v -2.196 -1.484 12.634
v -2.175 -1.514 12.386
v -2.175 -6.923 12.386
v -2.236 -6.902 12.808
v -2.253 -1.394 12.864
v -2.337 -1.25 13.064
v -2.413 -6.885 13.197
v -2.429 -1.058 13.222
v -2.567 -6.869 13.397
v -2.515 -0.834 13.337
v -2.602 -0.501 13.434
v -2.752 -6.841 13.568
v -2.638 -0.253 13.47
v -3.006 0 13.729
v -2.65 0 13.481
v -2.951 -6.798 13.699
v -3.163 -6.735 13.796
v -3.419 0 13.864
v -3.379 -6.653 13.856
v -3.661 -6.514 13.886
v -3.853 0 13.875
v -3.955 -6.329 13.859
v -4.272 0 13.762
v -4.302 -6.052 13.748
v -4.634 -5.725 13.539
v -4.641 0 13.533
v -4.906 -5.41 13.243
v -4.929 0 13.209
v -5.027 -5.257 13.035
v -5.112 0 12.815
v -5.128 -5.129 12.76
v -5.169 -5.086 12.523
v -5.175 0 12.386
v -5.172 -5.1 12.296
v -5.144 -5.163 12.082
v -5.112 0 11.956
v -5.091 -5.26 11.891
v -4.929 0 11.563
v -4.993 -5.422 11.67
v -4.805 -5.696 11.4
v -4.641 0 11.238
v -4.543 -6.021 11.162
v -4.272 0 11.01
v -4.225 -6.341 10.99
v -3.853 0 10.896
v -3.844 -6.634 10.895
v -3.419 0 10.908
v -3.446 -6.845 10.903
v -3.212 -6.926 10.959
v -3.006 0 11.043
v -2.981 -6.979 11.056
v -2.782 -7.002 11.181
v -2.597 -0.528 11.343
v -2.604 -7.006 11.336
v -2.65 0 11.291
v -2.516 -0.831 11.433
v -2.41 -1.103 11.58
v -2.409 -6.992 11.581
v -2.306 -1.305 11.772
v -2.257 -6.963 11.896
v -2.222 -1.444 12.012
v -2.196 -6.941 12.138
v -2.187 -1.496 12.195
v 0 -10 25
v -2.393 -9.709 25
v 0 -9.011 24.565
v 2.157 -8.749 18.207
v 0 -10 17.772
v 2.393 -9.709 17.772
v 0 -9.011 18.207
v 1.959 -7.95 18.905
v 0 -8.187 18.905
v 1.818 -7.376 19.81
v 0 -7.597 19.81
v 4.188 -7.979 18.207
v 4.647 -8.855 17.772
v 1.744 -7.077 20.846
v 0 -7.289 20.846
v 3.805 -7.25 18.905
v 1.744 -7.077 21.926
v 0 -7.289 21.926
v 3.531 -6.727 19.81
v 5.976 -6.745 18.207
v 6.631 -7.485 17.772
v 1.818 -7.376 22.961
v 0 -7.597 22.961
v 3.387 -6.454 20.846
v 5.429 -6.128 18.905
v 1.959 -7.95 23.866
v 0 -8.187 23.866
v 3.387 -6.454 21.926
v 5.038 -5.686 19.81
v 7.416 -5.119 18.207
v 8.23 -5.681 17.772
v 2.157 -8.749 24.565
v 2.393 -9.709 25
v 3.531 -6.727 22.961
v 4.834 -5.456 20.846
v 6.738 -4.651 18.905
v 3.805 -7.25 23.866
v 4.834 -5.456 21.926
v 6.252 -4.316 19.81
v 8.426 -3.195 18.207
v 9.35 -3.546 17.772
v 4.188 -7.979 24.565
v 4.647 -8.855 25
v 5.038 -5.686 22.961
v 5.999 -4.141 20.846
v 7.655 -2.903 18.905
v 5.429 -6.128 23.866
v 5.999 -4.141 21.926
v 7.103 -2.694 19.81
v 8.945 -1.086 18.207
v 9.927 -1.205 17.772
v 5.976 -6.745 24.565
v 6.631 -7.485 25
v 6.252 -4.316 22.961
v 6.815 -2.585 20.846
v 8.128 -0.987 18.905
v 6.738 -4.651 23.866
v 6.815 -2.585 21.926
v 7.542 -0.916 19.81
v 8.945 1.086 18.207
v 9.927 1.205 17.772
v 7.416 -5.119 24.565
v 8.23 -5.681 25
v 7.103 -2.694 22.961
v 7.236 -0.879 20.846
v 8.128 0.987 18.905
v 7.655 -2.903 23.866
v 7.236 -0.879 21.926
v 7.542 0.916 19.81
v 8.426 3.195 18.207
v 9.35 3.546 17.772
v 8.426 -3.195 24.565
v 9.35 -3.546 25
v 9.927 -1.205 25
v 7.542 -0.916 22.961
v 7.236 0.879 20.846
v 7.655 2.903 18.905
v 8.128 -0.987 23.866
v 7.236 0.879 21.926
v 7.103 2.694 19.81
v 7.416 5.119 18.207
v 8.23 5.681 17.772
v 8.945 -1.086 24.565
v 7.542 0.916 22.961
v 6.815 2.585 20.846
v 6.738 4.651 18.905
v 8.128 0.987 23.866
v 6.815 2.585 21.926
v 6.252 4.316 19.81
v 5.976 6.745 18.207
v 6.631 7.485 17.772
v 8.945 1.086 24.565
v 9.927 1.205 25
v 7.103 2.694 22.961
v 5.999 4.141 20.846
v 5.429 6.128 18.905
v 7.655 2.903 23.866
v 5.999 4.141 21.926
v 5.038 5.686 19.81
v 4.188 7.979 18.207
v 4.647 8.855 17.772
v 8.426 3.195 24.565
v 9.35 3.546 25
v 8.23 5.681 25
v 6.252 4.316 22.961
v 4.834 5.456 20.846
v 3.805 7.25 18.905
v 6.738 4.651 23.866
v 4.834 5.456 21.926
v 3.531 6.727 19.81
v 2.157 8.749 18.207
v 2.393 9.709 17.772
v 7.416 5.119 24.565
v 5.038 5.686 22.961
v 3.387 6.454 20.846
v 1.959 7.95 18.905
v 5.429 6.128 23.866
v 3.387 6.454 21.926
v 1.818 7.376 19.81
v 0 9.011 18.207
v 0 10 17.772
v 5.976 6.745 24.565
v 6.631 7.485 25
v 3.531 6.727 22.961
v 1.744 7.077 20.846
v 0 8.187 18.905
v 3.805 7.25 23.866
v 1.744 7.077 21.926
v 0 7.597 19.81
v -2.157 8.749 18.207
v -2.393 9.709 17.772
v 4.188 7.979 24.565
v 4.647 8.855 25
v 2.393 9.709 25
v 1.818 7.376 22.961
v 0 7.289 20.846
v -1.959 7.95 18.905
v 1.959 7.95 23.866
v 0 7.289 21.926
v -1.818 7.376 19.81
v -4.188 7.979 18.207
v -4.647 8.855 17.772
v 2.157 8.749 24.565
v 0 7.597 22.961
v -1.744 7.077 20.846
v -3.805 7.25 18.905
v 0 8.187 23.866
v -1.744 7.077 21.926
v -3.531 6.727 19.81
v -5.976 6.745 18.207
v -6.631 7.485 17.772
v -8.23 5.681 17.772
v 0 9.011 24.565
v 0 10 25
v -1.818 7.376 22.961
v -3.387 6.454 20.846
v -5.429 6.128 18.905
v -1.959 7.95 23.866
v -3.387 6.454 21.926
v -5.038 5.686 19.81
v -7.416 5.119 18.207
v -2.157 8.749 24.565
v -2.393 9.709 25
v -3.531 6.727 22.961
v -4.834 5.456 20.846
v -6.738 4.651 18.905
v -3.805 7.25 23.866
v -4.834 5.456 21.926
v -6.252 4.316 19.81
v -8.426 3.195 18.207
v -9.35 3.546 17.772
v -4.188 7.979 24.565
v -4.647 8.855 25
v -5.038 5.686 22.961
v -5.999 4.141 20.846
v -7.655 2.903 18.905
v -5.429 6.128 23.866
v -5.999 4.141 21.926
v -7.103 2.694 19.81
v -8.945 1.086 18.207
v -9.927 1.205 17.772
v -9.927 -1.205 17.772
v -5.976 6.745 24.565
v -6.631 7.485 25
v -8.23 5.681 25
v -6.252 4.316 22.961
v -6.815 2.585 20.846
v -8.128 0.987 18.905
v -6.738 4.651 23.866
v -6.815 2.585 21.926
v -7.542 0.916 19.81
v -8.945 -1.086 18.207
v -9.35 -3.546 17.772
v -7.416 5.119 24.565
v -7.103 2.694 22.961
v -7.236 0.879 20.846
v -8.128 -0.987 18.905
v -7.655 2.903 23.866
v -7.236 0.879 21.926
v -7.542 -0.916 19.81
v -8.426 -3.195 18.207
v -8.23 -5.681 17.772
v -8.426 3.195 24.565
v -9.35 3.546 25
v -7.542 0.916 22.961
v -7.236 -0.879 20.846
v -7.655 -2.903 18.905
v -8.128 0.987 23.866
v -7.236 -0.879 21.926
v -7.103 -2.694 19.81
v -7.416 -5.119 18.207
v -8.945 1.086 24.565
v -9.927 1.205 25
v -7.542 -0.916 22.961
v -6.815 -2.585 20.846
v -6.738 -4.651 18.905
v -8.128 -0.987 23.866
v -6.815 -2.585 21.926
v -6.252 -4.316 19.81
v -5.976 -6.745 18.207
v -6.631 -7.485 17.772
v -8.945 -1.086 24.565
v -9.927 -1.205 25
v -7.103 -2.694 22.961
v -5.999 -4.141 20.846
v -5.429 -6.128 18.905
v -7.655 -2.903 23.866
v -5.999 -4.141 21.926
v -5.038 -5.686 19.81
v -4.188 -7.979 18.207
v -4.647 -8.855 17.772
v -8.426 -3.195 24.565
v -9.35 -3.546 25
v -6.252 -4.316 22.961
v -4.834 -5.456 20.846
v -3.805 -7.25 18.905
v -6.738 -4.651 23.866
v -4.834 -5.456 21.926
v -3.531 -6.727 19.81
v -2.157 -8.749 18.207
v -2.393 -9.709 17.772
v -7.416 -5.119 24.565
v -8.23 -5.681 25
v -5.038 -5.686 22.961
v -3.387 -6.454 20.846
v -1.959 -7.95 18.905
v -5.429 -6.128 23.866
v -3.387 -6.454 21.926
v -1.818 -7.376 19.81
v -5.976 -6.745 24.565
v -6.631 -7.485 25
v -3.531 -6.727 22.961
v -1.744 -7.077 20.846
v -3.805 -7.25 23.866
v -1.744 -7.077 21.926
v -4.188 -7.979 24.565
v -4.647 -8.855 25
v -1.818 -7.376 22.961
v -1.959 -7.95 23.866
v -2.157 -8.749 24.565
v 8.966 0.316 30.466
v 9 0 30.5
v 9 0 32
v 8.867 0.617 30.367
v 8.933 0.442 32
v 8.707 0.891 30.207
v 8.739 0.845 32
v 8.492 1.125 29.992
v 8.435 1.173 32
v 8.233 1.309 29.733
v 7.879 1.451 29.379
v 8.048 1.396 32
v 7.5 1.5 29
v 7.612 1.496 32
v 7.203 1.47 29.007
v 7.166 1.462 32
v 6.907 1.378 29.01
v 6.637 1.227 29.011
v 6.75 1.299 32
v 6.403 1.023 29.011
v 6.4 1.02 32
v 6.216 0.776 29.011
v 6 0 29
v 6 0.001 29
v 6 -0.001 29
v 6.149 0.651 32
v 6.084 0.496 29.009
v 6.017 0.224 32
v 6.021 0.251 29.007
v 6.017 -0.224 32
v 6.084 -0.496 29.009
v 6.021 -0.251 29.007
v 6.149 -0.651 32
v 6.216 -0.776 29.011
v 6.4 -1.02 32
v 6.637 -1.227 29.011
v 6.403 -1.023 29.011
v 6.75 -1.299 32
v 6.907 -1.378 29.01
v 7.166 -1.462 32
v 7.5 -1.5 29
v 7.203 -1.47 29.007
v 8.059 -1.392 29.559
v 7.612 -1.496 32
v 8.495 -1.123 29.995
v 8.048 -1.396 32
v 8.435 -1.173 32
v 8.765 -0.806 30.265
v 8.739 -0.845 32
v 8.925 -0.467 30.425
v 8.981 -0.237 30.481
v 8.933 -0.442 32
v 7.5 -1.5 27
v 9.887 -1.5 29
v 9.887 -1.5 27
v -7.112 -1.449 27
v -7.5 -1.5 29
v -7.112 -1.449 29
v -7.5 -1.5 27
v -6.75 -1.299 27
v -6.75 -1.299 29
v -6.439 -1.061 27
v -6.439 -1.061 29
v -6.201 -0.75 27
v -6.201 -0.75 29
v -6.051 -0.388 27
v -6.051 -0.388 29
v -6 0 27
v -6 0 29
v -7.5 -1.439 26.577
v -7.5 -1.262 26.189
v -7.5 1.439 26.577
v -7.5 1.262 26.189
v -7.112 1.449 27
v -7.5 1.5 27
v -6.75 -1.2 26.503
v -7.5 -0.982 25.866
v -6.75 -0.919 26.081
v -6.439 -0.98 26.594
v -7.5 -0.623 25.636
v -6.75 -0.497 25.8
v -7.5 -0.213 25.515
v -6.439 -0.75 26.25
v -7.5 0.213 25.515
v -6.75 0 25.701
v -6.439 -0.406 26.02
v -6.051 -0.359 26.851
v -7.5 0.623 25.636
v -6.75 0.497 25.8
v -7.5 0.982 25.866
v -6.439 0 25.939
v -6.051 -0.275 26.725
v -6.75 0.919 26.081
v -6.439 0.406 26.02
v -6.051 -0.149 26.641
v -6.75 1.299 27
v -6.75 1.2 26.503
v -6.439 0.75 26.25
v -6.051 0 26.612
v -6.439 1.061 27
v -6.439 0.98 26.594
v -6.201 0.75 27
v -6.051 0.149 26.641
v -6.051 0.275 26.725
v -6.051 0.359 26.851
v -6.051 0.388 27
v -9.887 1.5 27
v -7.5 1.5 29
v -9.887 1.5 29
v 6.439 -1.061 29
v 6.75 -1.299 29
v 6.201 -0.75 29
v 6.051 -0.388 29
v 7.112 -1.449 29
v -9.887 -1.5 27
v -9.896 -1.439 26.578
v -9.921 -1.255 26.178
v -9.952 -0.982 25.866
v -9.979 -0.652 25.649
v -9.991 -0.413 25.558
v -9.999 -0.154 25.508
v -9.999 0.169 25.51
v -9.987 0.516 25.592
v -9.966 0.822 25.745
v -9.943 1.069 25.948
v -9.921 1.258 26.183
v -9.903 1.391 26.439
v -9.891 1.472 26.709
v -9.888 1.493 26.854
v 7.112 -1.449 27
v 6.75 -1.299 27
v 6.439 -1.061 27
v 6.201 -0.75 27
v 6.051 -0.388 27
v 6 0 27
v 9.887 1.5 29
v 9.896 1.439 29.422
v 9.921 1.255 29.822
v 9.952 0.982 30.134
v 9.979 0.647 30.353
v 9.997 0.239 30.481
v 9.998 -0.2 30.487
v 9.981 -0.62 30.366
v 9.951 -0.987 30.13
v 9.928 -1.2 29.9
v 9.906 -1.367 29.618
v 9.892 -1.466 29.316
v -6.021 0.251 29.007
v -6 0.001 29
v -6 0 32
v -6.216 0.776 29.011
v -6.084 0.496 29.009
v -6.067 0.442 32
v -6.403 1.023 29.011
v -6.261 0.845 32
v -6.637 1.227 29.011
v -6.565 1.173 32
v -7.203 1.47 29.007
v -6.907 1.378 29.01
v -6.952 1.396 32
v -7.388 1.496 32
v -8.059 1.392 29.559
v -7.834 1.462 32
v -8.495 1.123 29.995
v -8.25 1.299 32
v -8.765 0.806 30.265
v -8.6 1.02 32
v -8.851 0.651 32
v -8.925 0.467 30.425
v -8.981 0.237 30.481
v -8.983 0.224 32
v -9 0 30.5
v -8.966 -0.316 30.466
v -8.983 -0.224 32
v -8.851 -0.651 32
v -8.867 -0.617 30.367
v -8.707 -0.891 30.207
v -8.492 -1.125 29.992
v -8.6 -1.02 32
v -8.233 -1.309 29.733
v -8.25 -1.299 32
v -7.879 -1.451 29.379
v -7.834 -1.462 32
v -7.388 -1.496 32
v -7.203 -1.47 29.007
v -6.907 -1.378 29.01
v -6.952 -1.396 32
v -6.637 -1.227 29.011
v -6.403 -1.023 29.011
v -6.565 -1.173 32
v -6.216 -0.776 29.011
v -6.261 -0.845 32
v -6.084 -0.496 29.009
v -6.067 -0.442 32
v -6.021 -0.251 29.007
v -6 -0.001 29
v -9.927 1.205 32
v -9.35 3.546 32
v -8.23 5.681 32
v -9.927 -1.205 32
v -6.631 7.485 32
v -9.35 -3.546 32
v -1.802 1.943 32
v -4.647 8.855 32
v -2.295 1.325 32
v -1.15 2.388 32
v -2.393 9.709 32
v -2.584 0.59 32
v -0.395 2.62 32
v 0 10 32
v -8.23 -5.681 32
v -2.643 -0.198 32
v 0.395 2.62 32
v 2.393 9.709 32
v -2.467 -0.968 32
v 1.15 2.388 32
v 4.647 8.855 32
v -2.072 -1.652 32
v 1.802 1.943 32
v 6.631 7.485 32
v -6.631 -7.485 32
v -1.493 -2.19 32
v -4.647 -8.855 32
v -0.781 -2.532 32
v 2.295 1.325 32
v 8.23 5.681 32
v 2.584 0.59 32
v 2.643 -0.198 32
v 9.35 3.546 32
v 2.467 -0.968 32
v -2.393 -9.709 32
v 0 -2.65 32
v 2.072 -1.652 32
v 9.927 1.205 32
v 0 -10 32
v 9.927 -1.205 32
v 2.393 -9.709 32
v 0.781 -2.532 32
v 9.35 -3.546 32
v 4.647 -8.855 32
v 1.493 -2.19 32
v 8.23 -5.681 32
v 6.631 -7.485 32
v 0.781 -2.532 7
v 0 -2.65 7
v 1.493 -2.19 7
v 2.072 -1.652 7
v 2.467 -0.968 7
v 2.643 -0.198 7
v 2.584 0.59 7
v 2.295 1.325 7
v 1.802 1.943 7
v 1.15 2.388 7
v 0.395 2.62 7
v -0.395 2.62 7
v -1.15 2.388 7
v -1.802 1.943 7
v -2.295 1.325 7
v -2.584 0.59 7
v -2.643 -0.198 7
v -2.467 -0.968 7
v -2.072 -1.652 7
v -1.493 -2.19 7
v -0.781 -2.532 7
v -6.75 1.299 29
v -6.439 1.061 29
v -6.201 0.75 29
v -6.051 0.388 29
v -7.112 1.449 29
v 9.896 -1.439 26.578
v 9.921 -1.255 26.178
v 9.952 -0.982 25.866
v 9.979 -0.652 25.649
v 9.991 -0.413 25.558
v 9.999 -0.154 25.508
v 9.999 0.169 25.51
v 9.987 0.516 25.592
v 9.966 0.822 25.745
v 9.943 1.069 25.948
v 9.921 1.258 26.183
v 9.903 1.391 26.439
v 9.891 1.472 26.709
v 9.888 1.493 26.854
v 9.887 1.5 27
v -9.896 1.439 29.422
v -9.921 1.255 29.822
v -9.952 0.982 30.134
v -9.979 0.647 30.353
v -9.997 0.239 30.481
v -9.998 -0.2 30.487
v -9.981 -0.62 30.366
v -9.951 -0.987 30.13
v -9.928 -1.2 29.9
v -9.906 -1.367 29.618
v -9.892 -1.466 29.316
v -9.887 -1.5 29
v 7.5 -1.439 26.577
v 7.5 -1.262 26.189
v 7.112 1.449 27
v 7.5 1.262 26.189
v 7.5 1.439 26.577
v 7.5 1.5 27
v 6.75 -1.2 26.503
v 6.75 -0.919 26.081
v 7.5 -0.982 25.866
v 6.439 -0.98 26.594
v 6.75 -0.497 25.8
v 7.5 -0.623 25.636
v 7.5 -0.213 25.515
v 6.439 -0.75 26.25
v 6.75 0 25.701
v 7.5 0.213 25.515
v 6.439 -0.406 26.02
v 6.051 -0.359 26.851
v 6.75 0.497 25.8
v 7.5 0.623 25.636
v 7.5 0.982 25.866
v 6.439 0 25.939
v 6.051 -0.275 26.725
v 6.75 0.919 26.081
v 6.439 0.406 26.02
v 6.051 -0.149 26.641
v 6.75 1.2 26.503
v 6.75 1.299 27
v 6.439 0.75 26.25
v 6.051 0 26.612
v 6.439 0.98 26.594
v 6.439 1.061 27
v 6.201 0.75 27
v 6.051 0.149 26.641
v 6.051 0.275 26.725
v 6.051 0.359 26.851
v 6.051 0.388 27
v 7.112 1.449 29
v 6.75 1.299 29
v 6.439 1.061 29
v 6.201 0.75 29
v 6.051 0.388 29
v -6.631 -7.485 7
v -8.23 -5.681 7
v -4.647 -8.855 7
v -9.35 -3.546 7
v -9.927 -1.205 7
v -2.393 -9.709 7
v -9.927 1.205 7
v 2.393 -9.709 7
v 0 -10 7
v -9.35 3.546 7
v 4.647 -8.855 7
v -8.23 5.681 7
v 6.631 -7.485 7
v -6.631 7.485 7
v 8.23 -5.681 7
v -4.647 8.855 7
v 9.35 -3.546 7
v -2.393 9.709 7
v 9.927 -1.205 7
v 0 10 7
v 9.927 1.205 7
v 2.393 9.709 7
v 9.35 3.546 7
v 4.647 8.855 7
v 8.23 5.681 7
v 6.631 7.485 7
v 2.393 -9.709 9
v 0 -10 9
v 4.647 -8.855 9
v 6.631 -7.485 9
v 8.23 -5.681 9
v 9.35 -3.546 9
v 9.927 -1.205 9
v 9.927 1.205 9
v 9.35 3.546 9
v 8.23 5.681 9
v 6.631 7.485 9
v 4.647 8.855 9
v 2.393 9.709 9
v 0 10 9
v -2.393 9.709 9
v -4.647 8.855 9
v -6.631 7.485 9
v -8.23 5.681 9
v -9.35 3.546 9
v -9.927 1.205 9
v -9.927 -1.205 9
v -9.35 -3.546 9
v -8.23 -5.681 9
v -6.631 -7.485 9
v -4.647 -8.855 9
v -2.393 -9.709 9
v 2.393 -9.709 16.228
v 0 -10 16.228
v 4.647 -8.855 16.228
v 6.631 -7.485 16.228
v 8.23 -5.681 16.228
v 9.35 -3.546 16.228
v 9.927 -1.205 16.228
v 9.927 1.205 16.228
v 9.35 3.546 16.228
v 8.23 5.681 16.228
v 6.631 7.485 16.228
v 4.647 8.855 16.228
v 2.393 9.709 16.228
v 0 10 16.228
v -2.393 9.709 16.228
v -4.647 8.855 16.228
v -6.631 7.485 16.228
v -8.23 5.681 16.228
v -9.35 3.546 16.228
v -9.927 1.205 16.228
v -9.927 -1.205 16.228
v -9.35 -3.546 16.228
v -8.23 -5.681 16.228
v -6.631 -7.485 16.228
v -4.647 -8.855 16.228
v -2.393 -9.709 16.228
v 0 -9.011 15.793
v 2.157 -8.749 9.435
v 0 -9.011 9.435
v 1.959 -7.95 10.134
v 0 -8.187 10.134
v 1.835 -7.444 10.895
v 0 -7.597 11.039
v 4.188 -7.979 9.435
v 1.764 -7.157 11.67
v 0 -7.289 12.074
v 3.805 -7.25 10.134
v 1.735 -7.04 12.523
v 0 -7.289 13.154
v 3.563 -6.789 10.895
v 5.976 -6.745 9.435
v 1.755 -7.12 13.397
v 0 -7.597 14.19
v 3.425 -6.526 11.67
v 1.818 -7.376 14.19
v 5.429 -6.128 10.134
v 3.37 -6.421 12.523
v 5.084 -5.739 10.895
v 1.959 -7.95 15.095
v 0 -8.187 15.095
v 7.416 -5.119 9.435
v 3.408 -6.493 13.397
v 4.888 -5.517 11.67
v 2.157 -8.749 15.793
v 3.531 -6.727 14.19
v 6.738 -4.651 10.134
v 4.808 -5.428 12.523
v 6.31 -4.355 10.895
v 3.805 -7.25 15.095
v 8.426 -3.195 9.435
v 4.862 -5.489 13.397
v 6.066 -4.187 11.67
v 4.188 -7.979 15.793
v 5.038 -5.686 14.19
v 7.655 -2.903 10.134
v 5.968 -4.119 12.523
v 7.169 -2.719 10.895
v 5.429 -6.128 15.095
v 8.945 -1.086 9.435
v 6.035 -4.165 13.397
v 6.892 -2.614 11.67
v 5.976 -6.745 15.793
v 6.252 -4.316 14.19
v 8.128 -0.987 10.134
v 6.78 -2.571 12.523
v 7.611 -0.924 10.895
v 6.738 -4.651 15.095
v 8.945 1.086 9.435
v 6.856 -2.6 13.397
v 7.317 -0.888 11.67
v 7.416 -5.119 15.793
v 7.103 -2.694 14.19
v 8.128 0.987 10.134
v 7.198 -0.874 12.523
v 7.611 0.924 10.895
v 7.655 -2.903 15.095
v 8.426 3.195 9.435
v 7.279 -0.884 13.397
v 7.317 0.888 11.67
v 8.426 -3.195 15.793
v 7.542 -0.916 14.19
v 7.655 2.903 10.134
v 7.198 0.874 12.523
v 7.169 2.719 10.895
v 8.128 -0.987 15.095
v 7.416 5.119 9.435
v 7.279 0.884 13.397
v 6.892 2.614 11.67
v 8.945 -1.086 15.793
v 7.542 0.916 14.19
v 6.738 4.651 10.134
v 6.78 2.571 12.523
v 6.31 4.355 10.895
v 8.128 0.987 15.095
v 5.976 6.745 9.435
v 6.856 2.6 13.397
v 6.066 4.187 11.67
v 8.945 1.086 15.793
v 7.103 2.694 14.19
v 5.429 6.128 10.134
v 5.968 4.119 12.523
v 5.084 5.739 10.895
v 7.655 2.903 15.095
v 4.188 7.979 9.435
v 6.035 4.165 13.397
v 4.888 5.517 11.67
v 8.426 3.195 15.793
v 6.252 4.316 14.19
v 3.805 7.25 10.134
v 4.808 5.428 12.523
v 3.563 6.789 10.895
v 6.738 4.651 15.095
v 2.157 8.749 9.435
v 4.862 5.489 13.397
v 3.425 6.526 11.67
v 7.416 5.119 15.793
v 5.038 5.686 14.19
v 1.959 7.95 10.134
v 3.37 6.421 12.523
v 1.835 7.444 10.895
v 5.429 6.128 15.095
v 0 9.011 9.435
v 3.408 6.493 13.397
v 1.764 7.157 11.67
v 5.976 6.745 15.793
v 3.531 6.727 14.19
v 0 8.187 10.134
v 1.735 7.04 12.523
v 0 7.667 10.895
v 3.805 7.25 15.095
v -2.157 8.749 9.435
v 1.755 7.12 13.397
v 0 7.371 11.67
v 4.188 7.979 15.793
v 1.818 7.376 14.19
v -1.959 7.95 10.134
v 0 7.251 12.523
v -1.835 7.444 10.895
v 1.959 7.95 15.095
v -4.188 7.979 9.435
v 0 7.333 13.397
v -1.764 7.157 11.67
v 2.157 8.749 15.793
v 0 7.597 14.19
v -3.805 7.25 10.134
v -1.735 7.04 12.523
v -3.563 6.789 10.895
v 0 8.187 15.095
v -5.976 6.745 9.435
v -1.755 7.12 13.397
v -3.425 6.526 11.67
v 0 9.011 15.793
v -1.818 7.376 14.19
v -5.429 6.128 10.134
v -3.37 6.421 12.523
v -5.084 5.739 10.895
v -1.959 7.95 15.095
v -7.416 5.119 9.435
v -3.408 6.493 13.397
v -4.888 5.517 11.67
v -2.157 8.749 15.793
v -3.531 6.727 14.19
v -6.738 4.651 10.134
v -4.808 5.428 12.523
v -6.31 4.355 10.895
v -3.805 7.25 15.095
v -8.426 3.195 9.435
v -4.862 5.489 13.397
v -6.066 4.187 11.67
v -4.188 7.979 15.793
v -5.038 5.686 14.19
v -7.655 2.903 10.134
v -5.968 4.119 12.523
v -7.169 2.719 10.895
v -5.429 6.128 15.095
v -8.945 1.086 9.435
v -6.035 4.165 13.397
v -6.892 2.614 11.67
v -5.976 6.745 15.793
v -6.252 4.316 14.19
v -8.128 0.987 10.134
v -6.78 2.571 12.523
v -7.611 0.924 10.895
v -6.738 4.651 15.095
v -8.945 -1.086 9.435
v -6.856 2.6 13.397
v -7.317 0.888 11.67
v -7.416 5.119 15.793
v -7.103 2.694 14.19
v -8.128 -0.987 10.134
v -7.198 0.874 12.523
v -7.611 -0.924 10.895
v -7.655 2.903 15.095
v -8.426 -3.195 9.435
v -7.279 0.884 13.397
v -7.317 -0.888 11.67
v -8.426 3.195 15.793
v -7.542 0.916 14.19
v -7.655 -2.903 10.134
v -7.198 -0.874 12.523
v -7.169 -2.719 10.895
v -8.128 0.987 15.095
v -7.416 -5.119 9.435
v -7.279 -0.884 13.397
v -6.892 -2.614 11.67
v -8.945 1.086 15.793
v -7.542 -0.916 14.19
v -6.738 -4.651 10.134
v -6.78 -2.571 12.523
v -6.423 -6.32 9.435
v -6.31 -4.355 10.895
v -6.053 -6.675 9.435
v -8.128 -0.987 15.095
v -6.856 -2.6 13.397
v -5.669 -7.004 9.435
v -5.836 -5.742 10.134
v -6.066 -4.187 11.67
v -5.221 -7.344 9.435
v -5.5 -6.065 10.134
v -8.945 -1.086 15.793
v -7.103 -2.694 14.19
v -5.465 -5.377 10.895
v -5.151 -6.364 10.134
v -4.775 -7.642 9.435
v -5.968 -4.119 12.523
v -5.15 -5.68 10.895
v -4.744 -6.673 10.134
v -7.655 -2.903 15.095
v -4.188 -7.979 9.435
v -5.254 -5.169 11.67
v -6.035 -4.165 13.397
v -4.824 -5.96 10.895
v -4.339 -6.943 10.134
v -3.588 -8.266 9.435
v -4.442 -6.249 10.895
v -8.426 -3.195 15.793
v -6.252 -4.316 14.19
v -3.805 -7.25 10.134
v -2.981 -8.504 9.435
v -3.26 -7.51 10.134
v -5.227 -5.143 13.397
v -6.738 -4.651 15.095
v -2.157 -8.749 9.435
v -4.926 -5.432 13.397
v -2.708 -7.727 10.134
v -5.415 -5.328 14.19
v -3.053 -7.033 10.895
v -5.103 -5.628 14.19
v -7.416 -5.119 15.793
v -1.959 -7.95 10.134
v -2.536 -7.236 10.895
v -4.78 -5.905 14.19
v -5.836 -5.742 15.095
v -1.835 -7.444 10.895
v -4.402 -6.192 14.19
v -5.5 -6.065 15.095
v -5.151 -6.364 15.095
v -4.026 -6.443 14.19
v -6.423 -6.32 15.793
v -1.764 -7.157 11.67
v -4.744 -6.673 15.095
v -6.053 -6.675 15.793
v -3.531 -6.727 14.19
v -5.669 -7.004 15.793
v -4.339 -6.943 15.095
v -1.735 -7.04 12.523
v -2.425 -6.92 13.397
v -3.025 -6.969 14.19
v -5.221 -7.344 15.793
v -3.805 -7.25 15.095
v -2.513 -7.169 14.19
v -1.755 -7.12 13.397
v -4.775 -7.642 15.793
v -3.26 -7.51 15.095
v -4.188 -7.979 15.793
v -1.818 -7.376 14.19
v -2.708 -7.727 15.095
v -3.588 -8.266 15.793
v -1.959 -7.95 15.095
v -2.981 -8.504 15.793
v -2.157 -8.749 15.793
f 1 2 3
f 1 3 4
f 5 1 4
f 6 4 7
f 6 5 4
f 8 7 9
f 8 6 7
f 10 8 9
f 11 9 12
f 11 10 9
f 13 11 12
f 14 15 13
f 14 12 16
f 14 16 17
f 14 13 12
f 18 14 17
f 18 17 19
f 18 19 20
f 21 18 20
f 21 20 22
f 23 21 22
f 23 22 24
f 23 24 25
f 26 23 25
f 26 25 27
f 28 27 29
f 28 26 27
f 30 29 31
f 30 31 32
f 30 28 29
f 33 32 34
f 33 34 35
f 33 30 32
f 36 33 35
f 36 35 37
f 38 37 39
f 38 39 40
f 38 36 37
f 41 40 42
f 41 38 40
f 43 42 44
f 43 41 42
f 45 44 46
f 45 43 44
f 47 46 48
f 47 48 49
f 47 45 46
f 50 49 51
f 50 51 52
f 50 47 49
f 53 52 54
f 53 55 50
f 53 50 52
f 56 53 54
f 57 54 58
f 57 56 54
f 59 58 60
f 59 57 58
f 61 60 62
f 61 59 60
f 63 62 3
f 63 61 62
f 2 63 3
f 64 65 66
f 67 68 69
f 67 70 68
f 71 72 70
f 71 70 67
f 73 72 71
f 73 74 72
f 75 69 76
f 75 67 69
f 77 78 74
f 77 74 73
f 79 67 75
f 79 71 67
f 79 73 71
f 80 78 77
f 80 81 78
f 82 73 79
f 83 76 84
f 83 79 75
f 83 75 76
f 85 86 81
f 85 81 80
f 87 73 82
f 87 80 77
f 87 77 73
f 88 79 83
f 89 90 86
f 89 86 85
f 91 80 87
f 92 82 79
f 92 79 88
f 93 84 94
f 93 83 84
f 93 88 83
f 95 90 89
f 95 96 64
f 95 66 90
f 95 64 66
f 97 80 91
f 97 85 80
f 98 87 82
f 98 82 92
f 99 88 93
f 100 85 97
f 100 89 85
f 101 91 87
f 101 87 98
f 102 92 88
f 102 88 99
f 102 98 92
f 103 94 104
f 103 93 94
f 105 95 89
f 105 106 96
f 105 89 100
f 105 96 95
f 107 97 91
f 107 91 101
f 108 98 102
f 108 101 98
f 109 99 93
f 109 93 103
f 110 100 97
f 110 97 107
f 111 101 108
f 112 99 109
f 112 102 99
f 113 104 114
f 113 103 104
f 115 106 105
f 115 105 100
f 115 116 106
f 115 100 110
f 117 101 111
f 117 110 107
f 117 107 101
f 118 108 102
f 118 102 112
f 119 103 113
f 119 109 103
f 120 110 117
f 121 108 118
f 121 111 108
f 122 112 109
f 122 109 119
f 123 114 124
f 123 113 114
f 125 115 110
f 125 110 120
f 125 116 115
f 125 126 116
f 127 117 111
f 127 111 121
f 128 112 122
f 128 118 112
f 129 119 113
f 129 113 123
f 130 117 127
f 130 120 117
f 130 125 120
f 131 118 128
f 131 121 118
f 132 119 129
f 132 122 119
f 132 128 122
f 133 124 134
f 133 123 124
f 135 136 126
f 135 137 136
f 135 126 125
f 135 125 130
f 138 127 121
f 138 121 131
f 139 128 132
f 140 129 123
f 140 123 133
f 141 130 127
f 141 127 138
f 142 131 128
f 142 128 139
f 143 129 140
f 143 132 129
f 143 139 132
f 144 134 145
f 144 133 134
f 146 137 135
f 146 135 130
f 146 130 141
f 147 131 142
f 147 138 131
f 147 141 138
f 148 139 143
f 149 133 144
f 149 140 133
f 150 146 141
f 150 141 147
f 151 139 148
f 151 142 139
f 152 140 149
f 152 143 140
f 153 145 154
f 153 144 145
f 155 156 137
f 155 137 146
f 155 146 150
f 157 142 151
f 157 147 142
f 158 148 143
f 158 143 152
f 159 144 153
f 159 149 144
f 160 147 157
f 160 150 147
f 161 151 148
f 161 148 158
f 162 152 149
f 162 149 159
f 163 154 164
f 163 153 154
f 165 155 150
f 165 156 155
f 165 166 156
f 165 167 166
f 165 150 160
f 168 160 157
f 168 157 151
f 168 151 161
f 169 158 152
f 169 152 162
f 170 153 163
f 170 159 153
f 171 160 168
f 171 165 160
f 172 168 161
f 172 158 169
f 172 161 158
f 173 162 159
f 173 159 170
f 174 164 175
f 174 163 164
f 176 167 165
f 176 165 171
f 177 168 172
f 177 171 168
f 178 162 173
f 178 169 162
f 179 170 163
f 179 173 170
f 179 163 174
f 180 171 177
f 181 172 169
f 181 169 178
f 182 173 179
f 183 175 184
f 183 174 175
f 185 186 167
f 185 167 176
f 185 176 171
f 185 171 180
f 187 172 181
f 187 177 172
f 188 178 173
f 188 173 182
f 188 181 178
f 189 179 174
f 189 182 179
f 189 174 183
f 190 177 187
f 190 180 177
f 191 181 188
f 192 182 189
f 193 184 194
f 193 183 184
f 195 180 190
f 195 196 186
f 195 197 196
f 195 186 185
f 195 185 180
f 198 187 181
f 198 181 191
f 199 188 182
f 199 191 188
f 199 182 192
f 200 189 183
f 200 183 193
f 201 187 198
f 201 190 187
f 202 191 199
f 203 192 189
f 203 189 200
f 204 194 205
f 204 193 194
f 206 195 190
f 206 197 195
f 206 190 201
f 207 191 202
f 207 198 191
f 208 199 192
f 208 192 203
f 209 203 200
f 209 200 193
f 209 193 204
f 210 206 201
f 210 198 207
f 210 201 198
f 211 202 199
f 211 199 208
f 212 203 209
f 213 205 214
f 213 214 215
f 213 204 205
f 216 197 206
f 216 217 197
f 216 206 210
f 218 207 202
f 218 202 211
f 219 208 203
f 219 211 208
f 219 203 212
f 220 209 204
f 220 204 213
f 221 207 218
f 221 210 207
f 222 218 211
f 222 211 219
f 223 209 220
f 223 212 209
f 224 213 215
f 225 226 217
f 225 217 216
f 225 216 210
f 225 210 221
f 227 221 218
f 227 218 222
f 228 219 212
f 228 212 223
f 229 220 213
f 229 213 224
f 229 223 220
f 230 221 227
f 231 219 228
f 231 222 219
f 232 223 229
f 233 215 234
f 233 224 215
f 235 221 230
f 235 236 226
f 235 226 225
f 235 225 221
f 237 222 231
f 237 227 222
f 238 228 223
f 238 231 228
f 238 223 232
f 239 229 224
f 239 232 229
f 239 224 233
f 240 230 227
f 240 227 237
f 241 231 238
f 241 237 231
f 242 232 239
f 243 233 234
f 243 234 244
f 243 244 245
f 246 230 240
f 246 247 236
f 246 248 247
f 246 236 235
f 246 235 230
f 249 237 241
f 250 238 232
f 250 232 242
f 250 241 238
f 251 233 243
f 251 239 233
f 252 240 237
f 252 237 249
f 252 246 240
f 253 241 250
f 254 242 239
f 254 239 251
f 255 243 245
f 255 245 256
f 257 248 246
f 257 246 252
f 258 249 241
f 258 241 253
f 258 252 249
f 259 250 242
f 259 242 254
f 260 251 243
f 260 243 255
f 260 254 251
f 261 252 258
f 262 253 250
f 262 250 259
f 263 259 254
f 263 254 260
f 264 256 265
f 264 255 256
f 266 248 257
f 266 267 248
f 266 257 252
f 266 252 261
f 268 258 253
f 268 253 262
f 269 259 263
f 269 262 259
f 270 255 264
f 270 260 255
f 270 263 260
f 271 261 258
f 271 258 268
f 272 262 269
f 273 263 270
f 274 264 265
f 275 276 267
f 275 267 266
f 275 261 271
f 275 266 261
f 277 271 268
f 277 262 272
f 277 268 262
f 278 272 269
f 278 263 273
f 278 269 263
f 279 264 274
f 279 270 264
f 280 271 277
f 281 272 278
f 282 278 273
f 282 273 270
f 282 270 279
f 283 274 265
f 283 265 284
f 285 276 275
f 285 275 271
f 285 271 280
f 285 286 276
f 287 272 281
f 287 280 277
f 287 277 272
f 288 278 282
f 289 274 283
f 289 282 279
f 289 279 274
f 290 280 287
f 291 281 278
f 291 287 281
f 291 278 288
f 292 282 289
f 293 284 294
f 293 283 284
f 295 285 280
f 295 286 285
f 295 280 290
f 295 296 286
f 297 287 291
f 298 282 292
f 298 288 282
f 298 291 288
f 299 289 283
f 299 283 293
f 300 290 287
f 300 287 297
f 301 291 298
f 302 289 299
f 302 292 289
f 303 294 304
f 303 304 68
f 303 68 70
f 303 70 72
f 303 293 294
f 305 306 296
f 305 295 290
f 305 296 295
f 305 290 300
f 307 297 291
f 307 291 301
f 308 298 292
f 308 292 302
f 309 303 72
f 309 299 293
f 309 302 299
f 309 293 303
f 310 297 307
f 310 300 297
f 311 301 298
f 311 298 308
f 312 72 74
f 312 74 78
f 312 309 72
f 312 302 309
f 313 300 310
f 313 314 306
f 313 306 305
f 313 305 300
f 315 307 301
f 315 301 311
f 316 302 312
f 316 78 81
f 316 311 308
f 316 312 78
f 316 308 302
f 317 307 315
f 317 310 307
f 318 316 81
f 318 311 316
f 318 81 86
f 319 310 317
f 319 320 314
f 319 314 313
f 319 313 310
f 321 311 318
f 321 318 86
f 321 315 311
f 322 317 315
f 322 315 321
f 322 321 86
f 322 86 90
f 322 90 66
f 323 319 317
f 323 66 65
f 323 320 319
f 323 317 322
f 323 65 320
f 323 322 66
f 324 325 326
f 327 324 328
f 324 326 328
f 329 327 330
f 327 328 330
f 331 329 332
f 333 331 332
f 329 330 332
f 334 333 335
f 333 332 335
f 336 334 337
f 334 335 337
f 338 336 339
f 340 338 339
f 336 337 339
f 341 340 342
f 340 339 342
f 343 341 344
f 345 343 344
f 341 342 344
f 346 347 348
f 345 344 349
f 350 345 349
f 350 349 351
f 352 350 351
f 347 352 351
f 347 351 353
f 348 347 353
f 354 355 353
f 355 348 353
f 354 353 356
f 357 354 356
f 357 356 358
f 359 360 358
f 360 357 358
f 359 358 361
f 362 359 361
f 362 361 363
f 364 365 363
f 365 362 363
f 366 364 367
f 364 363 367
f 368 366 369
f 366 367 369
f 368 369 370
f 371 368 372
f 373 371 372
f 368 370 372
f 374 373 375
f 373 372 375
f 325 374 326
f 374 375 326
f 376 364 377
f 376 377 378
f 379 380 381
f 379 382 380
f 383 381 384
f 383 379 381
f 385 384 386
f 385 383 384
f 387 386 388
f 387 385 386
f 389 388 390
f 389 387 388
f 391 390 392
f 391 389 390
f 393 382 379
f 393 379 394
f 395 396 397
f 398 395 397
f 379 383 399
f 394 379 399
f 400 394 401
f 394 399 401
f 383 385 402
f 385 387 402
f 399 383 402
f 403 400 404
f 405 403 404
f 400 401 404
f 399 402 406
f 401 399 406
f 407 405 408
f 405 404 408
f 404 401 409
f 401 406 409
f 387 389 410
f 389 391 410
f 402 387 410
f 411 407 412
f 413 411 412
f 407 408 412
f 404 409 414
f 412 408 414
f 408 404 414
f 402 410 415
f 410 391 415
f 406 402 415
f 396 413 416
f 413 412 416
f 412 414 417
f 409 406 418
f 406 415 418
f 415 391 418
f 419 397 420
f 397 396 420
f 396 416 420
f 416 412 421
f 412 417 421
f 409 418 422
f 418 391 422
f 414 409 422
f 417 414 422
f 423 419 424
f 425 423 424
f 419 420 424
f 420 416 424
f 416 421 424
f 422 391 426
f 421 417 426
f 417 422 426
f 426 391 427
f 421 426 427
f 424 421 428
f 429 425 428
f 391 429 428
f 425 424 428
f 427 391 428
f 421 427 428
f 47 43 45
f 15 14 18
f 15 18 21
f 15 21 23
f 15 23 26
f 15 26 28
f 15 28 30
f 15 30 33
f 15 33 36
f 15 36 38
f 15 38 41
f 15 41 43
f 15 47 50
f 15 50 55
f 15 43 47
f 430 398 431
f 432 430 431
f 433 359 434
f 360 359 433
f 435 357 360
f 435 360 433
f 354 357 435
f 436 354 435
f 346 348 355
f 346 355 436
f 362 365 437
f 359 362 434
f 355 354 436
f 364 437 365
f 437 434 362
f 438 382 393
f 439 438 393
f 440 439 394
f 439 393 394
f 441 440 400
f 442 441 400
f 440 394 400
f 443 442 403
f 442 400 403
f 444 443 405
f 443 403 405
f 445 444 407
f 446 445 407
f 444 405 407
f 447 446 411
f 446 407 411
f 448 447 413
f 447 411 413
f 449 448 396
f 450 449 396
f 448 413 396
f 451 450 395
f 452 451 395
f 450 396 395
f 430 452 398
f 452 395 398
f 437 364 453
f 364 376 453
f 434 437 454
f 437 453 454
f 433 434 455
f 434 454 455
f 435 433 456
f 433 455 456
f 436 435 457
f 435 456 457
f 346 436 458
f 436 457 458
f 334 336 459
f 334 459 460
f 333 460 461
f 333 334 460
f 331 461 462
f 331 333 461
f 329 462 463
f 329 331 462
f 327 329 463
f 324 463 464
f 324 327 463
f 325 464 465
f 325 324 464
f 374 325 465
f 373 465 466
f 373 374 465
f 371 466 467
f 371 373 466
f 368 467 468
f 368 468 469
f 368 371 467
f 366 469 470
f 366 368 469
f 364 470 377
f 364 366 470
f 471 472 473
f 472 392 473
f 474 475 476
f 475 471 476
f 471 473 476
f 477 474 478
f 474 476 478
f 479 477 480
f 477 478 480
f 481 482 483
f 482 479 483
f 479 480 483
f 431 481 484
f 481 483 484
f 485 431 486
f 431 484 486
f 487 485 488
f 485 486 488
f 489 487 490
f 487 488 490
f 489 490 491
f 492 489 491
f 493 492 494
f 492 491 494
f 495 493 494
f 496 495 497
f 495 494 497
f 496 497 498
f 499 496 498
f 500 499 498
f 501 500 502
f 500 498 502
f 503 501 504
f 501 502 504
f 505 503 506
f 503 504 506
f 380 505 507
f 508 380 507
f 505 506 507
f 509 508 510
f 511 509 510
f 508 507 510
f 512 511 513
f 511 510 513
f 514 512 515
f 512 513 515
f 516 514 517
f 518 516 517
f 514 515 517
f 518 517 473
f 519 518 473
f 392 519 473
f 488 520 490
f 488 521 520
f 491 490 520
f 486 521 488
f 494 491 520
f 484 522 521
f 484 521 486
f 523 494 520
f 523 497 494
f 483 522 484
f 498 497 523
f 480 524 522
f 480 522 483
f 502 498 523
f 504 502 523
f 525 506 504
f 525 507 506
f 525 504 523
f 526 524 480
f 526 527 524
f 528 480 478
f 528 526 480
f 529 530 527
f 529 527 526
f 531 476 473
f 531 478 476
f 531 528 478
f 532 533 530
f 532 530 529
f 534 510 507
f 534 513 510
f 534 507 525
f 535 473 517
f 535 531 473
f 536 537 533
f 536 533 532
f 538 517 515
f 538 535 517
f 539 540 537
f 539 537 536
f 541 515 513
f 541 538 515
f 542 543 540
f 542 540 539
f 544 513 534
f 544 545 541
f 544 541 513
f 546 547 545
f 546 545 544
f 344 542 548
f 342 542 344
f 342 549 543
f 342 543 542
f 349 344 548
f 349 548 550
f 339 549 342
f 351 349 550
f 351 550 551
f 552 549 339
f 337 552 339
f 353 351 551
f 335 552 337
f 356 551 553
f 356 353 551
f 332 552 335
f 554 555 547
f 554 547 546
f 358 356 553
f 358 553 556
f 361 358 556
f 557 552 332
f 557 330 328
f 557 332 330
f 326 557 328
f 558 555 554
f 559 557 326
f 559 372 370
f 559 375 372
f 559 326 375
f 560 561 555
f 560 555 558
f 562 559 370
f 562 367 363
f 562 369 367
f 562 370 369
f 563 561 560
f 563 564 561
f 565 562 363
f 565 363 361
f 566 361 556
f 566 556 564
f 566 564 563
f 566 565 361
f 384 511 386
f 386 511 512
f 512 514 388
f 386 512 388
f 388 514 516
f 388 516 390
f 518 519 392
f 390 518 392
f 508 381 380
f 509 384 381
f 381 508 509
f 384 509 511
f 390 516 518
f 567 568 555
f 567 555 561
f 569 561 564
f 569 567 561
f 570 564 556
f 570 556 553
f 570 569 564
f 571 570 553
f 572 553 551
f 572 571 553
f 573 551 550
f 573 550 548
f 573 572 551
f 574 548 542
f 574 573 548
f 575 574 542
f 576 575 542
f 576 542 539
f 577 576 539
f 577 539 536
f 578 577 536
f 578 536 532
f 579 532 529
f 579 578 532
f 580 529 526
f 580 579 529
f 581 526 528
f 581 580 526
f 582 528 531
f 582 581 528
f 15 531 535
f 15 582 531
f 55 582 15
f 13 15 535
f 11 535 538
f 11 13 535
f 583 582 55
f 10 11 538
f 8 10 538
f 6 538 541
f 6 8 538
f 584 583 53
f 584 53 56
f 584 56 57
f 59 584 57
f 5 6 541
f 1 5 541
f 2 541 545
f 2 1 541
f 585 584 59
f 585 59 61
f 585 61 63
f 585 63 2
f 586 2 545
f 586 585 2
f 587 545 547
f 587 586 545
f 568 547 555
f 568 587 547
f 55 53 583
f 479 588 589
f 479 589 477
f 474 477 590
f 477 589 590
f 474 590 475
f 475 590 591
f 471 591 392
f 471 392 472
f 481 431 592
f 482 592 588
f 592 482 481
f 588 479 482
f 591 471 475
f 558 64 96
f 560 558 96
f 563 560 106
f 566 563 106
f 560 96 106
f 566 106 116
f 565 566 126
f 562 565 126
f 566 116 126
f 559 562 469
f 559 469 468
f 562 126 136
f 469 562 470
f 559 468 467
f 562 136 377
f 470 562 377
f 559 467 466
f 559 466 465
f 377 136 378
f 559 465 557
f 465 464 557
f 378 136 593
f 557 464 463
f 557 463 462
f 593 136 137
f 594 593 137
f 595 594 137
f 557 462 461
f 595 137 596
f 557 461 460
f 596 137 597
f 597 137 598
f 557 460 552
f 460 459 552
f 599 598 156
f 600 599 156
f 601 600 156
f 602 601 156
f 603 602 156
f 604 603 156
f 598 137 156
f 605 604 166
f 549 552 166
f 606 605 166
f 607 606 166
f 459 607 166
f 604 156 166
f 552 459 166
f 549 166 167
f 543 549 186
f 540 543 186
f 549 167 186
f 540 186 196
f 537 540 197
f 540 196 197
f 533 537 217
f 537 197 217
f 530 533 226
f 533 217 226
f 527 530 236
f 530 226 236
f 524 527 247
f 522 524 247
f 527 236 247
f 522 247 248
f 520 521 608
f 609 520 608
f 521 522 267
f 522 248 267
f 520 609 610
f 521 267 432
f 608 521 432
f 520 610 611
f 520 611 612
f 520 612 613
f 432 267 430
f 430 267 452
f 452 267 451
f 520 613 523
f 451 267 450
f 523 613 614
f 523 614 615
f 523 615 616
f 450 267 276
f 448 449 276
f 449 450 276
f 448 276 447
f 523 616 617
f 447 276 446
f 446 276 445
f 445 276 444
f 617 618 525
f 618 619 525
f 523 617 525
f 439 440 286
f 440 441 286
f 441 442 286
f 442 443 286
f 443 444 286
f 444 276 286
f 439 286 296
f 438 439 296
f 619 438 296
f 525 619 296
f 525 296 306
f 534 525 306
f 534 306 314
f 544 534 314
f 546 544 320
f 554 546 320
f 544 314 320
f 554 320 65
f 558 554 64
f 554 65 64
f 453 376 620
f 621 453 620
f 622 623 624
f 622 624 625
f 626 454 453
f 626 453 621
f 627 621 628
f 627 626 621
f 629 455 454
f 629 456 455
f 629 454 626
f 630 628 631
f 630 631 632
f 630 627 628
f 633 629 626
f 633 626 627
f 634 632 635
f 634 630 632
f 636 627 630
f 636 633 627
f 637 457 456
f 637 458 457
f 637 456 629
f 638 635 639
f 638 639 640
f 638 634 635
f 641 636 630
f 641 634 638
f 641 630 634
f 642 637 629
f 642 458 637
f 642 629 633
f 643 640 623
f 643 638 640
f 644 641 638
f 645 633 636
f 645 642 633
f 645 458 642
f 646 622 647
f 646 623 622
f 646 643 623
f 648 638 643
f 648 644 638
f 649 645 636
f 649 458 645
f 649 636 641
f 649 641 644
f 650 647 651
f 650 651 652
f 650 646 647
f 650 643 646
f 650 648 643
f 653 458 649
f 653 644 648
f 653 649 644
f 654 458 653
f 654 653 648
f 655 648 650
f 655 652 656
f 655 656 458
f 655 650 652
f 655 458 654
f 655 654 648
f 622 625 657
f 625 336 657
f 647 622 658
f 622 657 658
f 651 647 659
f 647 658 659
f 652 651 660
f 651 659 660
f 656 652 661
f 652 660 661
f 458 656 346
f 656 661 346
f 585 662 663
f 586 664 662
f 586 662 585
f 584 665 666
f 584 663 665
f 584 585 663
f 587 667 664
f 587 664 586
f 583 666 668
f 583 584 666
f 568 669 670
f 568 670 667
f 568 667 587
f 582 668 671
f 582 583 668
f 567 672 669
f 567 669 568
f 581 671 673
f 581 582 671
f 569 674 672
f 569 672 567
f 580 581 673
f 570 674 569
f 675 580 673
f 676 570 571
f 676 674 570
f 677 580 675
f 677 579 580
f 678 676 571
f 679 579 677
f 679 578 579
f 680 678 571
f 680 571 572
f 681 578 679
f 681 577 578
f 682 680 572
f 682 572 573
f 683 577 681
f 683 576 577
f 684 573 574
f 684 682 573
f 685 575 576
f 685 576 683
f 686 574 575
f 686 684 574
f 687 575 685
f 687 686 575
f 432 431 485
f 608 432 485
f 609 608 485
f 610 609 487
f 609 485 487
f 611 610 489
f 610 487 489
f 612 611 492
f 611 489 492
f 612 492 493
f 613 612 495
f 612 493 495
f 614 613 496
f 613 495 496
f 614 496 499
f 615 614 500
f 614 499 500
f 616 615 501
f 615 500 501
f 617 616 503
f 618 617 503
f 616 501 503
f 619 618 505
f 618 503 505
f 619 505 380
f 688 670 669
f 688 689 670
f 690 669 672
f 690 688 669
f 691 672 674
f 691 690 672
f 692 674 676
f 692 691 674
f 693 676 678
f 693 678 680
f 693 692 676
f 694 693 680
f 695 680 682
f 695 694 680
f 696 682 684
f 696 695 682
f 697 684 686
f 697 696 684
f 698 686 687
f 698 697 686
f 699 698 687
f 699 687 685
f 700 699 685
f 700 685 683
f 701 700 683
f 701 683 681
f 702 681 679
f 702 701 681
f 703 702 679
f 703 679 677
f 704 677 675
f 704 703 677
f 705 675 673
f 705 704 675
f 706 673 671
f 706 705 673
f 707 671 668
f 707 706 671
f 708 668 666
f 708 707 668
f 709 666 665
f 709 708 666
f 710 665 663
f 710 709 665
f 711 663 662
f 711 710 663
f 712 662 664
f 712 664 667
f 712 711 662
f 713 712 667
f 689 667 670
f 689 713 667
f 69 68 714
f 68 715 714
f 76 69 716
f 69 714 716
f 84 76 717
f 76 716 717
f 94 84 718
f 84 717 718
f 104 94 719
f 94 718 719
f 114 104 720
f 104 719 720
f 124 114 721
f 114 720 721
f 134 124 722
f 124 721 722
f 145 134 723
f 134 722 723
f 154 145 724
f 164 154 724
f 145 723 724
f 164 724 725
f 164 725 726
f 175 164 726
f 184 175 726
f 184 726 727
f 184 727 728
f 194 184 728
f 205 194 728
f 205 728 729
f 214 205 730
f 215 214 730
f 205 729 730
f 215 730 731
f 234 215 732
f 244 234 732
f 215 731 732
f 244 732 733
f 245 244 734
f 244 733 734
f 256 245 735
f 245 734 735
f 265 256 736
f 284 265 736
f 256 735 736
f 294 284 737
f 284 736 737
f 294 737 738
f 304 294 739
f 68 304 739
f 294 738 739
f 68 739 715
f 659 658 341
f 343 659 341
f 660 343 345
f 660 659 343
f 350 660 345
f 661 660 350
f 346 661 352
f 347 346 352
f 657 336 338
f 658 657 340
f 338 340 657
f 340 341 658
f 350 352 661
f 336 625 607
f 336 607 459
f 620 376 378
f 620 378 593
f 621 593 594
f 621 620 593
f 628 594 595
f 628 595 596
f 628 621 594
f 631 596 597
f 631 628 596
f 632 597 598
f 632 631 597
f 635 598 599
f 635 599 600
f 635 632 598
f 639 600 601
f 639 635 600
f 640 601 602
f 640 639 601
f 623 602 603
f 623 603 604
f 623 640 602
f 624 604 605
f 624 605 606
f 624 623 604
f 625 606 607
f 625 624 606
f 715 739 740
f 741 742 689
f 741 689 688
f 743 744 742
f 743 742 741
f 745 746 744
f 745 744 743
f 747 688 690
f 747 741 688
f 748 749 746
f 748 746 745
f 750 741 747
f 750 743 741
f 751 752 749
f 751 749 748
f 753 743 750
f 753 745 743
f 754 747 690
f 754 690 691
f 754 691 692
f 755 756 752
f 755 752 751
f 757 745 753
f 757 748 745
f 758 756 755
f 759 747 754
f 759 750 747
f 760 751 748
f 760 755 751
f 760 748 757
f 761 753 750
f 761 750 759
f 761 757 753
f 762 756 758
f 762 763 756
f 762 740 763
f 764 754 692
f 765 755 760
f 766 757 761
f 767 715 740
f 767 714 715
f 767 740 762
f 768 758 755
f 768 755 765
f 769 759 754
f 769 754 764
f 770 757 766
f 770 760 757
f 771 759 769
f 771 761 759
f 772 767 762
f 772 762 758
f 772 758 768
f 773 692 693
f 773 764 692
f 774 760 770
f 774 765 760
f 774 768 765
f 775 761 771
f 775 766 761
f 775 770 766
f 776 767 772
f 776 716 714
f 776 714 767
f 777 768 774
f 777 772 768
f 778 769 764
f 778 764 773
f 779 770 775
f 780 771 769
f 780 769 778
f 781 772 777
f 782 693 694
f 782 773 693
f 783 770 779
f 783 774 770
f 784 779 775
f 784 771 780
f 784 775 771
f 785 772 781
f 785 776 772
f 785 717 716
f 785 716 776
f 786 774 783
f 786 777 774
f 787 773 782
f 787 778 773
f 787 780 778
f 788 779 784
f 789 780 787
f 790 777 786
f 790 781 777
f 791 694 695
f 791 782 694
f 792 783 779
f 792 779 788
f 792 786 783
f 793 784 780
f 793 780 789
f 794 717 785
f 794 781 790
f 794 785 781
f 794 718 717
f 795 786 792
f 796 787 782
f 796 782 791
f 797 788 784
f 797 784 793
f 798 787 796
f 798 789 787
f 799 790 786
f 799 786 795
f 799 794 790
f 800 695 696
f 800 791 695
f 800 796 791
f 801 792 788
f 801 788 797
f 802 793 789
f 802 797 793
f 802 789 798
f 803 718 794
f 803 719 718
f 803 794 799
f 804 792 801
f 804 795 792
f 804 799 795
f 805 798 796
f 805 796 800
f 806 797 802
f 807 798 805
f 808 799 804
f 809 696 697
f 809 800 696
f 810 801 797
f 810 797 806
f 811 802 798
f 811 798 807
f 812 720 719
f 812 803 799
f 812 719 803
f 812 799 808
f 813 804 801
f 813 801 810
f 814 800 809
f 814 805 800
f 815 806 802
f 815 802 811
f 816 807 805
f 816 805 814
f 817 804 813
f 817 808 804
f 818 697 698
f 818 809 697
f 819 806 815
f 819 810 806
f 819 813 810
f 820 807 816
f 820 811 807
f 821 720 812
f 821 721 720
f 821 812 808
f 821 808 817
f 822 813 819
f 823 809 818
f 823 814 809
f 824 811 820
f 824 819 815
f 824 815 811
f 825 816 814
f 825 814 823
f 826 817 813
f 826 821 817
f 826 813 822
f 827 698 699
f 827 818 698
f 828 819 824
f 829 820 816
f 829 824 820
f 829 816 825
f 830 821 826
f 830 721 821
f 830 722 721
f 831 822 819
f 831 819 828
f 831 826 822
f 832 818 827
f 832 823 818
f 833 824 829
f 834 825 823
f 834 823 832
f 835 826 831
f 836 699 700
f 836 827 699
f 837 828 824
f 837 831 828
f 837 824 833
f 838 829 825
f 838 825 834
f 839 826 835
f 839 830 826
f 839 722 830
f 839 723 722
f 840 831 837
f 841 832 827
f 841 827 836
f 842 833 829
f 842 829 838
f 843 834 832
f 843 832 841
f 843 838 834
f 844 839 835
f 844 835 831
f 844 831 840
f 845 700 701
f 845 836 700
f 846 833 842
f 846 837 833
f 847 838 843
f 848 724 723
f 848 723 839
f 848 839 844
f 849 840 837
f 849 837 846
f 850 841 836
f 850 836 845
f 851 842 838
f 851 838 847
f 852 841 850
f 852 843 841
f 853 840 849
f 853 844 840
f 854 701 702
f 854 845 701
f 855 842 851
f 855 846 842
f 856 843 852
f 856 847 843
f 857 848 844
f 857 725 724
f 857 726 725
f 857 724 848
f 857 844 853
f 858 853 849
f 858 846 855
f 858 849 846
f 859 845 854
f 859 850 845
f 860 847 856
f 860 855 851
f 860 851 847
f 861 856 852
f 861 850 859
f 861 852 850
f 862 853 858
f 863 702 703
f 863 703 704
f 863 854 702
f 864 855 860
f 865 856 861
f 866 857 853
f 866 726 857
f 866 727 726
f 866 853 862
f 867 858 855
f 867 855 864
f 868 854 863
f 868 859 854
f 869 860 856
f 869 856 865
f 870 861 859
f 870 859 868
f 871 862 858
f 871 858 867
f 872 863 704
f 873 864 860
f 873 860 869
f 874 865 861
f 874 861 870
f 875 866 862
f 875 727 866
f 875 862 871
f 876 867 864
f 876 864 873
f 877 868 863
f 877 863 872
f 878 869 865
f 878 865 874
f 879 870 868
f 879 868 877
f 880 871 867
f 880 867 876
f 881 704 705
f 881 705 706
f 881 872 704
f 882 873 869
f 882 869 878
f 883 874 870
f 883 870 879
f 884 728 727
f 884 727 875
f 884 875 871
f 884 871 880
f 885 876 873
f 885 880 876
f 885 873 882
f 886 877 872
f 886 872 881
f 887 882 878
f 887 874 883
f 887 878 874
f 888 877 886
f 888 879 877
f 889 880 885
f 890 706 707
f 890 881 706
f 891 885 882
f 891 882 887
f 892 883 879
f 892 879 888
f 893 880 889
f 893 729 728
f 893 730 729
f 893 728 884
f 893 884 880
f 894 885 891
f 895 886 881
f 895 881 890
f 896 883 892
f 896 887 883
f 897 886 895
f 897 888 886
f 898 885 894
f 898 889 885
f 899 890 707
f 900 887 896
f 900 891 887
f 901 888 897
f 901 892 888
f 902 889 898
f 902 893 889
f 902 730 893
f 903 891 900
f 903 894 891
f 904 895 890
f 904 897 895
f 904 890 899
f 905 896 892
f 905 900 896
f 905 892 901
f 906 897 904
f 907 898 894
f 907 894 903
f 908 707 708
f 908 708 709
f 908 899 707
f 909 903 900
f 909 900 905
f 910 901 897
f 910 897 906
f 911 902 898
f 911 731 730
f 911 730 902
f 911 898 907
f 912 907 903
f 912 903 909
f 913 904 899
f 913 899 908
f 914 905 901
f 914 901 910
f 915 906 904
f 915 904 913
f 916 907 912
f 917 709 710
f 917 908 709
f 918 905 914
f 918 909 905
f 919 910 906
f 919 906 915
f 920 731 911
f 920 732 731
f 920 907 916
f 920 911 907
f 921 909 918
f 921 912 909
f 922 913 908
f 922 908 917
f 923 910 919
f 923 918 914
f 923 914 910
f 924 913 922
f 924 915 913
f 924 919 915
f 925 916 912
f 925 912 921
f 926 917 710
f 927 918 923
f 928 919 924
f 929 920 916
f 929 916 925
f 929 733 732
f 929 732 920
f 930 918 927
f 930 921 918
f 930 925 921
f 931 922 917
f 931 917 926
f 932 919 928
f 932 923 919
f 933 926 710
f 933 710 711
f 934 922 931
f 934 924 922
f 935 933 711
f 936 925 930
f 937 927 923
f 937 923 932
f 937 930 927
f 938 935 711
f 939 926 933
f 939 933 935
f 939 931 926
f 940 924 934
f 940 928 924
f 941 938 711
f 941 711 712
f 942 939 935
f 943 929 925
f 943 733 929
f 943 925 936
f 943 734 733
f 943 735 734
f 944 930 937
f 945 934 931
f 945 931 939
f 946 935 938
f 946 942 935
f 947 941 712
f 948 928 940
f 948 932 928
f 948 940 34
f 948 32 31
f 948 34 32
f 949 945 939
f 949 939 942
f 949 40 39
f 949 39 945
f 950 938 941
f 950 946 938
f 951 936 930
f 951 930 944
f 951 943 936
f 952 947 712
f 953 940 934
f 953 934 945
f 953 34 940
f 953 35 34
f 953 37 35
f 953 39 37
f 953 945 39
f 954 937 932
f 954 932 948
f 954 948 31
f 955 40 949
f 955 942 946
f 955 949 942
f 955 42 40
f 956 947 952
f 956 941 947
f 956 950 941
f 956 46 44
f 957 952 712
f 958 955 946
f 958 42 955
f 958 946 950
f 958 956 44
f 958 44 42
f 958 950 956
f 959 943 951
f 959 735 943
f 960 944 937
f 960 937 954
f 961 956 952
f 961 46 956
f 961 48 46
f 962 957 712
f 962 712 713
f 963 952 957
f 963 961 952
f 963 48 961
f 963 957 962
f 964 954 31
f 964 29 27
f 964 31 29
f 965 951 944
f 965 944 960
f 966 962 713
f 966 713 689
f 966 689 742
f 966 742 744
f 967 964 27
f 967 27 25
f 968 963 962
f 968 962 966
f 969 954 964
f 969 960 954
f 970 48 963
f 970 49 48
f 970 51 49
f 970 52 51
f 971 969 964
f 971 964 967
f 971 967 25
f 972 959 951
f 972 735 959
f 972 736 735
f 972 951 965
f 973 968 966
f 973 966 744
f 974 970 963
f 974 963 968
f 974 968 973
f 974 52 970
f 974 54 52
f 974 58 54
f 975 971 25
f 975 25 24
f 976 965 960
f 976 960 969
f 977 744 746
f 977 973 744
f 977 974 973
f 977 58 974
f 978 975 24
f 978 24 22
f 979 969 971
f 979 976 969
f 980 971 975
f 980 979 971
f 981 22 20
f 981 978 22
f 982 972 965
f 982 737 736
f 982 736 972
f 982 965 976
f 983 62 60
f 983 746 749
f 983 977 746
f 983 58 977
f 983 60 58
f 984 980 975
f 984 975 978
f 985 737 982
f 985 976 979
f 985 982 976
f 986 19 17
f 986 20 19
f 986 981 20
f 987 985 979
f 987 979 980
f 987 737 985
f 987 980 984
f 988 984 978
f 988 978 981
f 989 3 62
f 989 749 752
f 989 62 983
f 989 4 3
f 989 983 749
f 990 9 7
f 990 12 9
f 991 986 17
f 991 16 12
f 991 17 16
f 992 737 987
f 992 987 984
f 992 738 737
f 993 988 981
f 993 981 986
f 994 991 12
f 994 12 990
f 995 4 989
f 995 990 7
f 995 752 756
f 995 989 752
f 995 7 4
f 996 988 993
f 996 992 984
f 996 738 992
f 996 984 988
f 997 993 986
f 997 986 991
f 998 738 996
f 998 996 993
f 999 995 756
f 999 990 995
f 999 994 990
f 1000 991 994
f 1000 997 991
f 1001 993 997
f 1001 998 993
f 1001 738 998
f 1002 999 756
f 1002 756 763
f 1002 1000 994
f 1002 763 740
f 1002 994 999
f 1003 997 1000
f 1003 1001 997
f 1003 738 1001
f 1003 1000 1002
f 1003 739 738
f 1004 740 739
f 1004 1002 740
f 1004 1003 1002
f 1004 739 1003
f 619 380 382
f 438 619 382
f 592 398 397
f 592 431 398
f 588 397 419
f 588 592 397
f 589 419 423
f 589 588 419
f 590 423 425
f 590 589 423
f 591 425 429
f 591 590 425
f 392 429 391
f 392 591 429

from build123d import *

# Parameters (mm, degrees)
SKETCH029_R      = 1.5
EXTRUDE023_DEPTH = 20
EXTRUDE022_DEPTH = 5
FILLET010_R      = 1.4999
EXTRUDE021_DEPTH = 5
FILLET009_R      = 1.4999
SKETCH026_R      = 1.5
EXTRUDE020_DEPTH = 5


with BuildPart() as extrude023:
    # Sketch029 → Extrude023 (new body)
    with BuildSketch(Plane.XZ):
        with Locations((-3.675, 12.385792)):
            Circle(SKETCH029_R)
    extrude(amount=EXTRUDE023_DEPTH)


with BuildPart() as fillet010:
    # Sketch028 → Extrude022 (new body)
    with BuildSketch(Plane.YZ):
        with BuildLine():
            ThreePointArc((1.5, 27), (0, 28.5), (-1.5, 27))
            Line((-1.5, 27), (-1.5, 25))
            ThreePointArc((-1.5, 25), (0, 23.5), (1.5, 25))
            Line((1.5, 25), (1.5, 27))
        make_face()
    extrude(amount=EXTRUDE022_DEPTH)


with BuildPart() as fillet010_1:
    # Extrude022 placement: moved
    add(fillet010.part.moved(Location((6, 0, 0))))

    # Fillet010
    fillet010_edges = [fillet010_1.edges().sort_by_distance(p)[0] for p in [
        (6, 0, 28.5),
    ]]
    fillet(fillet010_edges, radius=FILLET010_R)


with BuildPart() as fillet010_2:
    # Fillet010 placement: moved
    add(fillet010_1.part.moved(Location((0, 0, 2))))


with BuildPart() as fillet009:
    # Sketch027 → Extrude021 (new body)
    with BuildSketch(Plane.YZ):
        with BuildLine():
            ThreePointArc((1.5, 27), (0, 28.5), (-1.5, 27))
            Line((-1.5, 27), (-1.5, 25))
            ThreePointArc((-1.5, 25), (0, 23.5), (1.5, 25))
            Line((1.5, 25), (1.5, 27))
        make_face()
    extrude(amount=EXTRUDE021_DEPTH)


with BuildPart() as fillet009_1:
    # Extrude021 placement: moved
    add(fillet009.part.moved(Location((6, 0, 0))))

    # Fillet009
    fillet009_edges = [fillet009_1.edges().sort_by_distance(p)[0] for p in [
        (6, 0, 28.5),
    ]]
    fillet(fillet009_edges, radius=FILLET009_R)


with BuildPart() as fillet009_2:
    # Fillet009 placement: moved
    add(fillet009_1.part.moved(Location((0, 0, 2))))


with BuildPart() as fusion008:
    # Part__Mirroring: instance of Fillet009
    add(fillet009_2.part.mirror(Plane(origin=(0, 0, 0), x_dir=(0, -1, 0), z_dir=(1, 0, 0))))

    # Fusion008: union Fillet010
    add(fillet010_2.part)


with BuildPart() as extrude020:
    # Sketch026 → Extrude020 (new body)
    with BuildSketch(Plane.XY):
        with Locations((7.5, 0)):
            Circle(SKETCH026_R)
        with Locations((-7.5, 0)):
            Circle(SKETCH026_R)
    extrude(amount=-EXTRUDE020_DEPTH)


with BuildPart() as extrude020_1:
    # Extrude020 placement: moved
    add(extrude020.part.moved(Location((0, 0, 32))))


with BuildPart() as cut008:
    # Sketch025 → Revolve001 (revolve)
    with BuildSketch(Plane.YZ):
        with BuildLine():
            Line((-2.65, 27), (-2.65, 7))
            Line((-2.65, 7), (-10, 7))
            Line((-10, 7), (-10, 9))
            ThreePointArc((-10, 9), (-7.25, 12.614208), (-10, 16.228416))
            Line((-10, 17.771584), (-10, 16.228416))
            ThreePointArc((-10, 17.771584), (-7.25, 21.385792), (-10, 25))
            Line((-10, 27), (-10, 25))
            Line((-10, 27), (-10, 32))
            Line((-10, 32), (-2.65, 32))
            Line((-2.65, 32), (-2.65, 27))
        make_face()
    revolve(axis=Axis((0, 0, 0), (0, 0, 1)))

    # Cut006: cut Extrude020
    add(extrude020_1.part, mode=Mode.SUBTRACT)

    # Cut007: cut Fusion008
    add(fusion008.part, mode=Mode.SUBTRACT)

    # Cut008: cut Extrude023
    add(extrude023.part, mode=Mode.SUBTRACT)


solid = cut008.part
